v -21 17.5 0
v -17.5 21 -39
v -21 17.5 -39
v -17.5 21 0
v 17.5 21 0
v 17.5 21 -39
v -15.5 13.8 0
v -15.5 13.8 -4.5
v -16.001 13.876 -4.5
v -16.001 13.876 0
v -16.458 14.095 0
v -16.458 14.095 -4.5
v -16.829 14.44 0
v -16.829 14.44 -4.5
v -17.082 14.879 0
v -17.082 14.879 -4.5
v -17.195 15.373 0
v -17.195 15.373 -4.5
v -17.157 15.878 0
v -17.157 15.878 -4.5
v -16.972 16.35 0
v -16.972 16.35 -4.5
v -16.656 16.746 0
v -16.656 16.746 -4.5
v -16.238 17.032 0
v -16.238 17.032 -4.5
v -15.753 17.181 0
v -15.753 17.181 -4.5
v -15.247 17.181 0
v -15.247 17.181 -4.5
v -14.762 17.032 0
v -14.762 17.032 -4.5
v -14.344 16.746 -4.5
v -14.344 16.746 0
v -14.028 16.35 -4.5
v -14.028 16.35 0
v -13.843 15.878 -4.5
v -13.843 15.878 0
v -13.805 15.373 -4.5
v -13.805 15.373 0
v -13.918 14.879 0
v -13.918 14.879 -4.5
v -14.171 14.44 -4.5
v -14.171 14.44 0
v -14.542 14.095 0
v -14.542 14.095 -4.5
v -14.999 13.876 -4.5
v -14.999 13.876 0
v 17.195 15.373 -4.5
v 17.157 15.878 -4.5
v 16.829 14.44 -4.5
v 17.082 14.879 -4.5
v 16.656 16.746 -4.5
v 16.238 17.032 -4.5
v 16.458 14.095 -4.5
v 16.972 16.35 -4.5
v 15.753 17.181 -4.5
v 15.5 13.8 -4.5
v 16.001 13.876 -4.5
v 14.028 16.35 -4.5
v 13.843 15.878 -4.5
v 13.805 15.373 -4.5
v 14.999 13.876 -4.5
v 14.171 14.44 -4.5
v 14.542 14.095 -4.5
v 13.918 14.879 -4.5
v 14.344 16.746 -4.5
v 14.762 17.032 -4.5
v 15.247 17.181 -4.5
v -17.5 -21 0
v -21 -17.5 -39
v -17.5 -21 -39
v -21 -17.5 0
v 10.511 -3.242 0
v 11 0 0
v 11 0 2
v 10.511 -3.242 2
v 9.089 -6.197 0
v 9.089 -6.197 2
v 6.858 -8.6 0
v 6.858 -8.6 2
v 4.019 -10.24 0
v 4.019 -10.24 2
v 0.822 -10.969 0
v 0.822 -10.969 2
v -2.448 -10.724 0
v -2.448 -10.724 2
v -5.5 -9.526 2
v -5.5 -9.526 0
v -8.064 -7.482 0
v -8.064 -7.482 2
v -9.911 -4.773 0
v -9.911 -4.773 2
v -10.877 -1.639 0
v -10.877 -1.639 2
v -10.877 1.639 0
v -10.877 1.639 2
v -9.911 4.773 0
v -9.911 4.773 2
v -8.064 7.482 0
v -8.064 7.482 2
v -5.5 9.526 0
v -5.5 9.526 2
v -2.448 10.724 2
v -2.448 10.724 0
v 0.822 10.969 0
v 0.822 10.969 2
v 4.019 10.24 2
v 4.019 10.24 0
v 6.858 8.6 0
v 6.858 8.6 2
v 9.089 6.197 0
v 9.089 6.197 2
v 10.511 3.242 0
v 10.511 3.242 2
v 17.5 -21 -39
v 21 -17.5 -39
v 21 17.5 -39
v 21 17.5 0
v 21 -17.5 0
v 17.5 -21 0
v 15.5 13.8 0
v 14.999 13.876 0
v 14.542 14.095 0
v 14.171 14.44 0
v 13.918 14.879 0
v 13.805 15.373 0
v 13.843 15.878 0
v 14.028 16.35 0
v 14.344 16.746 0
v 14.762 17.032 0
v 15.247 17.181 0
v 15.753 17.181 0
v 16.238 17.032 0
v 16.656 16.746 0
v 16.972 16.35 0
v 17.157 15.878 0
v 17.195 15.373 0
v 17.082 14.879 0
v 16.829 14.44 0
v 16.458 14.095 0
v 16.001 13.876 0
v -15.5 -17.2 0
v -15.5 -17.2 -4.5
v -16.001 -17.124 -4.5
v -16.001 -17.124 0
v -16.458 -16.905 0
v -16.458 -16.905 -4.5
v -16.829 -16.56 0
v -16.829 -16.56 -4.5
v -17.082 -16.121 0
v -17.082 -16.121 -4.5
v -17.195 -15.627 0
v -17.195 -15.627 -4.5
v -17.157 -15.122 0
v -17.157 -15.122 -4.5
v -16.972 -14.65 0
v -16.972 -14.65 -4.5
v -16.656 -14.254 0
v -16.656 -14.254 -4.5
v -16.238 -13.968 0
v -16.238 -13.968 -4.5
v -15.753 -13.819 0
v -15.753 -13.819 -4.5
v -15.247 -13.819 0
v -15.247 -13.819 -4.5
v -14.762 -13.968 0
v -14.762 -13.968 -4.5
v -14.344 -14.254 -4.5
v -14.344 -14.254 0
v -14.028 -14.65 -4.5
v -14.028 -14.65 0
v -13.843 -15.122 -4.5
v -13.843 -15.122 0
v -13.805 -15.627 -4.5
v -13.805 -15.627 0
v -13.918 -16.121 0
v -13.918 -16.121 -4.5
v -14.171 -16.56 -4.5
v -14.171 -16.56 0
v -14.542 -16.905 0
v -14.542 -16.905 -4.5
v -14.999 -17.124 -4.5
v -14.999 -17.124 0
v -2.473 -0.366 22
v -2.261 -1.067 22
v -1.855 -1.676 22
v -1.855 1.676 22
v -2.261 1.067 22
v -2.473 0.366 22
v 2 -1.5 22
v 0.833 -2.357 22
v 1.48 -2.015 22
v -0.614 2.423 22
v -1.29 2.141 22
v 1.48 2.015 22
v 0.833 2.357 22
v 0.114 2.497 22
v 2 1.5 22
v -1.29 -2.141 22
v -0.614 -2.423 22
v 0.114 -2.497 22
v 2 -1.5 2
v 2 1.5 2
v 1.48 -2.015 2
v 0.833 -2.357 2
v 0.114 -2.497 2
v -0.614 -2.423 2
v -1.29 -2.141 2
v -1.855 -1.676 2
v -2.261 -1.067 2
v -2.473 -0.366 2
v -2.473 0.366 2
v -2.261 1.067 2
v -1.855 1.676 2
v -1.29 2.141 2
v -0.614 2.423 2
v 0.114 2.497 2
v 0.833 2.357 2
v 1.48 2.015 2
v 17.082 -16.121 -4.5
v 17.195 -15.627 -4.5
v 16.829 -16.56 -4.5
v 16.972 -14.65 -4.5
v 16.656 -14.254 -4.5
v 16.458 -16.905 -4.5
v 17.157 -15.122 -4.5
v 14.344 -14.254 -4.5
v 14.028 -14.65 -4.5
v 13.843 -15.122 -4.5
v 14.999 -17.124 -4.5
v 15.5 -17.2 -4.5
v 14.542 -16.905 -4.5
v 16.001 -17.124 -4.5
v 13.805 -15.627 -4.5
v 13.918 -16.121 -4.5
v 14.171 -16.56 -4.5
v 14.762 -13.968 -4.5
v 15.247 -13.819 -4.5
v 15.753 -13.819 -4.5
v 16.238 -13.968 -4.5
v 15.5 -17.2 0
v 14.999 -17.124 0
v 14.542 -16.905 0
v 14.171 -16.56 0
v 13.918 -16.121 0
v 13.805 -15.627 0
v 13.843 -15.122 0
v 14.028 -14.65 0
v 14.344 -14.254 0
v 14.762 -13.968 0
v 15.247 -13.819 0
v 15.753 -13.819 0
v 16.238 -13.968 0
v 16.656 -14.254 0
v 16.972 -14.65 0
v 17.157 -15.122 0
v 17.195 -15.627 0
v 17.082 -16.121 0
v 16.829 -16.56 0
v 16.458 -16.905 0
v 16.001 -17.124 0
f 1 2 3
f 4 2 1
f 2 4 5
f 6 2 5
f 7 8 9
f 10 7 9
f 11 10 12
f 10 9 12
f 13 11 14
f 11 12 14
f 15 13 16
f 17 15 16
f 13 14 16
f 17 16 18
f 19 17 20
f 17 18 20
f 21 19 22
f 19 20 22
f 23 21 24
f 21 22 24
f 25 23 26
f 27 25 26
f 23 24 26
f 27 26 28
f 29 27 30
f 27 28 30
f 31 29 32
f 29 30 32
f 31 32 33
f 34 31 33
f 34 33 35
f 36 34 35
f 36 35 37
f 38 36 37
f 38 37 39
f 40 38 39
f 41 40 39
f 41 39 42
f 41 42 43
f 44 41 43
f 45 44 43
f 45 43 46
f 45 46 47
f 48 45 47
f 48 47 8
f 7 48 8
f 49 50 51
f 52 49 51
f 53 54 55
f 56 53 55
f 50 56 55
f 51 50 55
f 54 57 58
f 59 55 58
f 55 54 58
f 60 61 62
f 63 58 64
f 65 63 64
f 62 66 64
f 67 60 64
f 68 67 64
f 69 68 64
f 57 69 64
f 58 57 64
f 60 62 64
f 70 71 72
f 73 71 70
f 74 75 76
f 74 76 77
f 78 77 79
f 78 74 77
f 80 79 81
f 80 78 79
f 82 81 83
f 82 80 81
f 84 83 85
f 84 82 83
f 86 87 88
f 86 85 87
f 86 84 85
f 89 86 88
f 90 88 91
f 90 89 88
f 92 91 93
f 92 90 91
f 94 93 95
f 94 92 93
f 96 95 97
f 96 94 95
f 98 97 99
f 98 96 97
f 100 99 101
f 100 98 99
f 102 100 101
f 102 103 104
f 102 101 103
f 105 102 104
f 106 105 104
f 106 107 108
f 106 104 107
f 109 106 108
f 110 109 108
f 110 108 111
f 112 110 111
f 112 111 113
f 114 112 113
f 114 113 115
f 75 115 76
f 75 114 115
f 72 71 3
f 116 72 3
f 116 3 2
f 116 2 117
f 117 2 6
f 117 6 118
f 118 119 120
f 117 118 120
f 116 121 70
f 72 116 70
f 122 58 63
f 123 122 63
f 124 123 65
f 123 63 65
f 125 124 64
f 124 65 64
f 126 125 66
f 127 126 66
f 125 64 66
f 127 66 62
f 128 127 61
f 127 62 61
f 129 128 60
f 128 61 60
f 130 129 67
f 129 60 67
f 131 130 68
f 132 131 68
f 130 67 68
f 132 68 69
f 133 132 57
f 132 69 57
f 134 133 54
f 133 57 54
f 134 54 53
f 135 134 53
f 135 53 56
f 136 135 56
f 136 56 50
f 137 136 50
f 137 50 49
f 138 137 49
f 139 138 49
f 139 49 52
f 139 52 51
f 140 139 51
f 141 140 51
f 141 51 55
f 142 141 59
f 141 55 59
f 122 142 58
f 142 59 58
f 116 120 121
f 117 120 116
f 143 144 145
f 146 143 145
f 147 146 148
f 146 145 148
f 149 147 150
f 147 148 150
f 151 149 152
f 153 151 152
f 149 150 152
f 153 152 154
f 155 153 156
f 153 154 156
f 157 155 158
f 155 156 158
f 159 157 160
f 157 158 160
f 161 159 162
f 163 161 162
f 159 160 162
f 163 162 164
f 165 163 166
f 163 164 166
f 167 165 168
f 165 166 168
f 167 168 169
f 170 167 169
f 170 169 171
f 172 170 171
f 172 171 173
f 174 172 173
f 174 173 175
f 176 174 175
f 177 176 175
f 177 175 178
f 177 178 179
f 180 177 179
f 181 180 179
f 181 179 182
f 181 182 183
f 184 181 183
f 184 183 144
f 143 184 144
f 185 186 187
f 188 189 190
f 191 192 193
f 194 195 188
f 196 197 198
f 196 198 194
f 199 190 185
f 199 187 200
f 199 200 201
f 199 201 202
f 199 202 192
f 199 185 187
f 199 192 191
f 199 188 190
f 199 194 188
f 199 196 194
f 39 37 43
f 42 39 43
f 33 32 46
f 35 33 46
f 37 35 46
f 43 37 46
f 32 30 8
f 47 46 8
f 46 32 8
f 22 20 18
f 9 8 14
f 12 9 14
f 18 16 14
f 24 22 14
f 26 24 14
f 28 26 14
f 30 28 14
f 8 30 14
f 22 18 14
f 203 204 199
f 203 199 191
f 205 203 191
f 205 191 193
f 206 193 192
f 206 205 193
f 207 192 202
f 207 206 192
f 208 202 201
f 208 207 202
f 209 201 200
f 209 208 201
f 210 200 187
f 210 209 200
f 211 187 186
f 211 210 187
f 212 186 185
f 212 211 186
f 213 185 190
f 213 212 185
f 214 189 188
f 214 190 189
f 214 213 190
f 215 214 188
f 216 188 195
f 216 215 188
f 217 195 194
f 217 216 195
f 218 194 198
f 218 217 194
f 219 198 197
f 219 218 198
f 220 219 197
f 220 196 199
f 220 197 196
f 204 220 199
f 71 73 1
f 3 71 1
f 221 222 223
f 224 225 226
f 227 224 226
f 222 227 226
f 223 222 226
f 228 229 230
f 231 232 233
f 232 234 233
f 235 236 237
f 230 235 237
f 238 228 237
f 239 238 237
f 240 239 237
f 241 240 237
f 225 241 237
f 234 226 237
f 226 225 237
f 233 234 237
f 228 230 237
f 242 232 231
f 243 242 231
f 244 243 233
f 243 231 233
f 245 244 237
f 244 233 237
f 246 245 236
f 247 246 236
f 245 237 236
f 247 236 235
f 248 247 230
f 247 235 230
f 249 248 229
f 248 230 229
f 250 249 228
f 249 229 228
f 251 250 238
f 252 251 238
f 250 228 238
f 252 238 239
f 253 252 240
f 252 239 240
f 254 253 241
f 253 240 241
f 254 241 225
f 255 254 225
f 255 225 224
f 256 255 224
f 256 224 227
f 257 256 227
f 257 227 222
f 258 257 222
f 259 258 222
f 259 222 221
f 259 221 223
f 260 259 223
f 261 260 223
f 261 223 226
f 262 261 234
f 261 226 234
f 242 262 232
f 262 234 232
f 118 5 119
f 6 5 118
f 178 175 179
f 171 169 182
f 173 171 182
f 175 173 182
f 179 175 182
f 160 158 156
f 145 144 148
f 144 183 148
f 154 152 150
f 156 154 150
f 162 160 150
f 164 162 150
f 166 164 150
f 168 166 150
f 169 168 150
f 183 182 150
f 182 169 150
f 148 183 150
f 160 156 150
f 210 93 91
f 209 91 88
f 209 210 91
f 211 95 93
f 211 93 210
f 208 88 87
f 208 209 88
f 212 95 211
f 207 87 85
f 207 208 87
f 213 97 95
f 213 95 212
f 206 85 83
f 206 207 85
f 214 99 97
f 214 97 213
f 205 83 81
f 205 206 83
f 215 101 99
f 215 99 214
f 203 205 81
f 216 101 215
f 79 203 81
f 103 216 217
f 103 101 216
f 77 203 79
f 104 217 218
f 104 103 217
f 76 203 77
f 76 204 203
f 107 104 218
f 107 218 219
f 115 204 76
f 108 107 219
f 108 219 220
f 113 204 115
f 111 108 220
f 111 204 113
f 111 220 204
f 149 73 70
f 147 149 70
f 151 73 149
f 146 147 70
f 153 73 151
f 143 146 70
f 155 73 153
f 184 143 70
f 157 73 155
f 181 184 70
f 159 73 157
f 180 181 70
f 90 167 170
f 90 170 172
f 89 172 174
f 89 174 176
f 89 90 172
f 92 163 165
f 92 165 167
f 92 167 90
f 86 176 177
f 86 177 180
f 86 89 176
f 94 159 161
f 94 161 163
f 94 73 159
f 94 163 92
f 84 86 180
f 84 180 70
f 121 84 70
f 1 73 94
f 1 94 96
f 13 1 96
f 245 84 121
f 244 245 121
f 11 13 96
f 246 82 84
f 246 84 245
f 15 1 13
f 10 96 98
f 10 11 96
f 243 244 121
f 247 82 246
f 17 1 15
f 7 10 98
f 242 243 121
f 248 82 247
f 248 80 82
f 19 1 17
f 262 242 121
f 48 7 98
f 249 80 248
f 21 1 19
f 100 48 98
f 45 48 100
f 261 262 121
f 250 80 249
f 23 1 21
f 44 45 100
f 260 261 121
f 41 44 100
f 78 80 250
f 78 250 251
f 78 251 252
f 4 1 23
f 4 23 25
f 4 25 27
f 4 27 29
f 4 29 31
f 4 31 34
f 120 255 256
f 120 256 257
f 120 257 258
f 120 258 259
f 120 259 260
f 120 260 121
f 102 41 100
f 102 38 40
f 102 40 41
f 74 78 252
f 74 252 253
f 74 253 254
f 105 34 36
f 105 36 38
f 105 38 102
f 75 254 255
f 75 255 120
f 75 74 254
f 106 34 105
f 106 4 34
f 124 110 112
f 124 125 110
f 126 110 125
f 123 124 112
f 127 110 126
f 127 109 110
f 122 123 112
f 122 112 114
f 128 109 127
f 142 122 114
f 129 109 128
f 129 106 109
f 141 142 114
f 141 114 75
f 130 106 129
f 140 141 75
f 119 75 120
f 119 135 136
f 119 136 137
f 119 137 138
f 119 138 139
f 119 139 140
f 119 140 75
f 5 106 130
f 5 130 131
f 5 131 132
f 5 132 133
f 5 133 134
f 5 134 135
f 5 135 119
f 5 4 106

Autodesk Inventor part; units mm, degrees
ref_plane "YZ Plane" through (0, 0, 0) normal (1, 0, 0) x (0, 1, 0)
ref_plane "XZ Plane" through (0, 0, 0) normal (0, 1, 0) x (-1, 0, 0)
ref_plane "XY Plane" through (0, 0, 0) normal (0, 0, 1) x (1, 0, 0)
sketch "Sketch1" plane through (0, 0, 0) normal (0, 0, 1) x (1, 0, 0)
  line L0 (21, -21) -> (-21, -21)
  line L1 (-21, -21) -> (-21, 21)
  line L2 (-21, 21) -> (21, 21)
  line L3 (21, 21) -> (21, -21)
  line L4 (21, -21) -> (-21, 21) construction
  line L5 (-21, -21) -> (21, 21) construction
  circle A0 centre (0, 0) radius 11
  circle A1 centre (0, 0) radius 2.5
  line L6 (2, 1.5) -> (2, -1.5)
  line L7 (0, 21) -> (0, -21) construction
  line L8 (-21, 0) -> (21, 0) construction
  point P0 (-15.5, 15.5)
  point P1 (15.5, 15.5)
  point P2 (15.5, -15.5)
  point P3 (-15.5, -15.5)
  dimension "d0" = 42
  dimension "d1" = 42
  dimension "d2" = 22
  dimension "d3" = 5
  dimension "d4" = 2
  dimension "d5" = 31
extrude "Extrusion1" add sketch "Sketch1" against normal blind 39 contours L0 L1 L2 L3 | A0 | A1 L6 | L6 A1
extrude "Extrusion2" add sketch "Sketch1" along normal blind 2 contours A0 | A1 L6 | L6 A1
extrude "Extrusion3" add sketch "Sketch1" along normal blind 22 contours L6 A1 picked at (0.2258, 0.7583)
hole "Hole1" at (-15.5, -15.5, 0) at (-15.5, 15.5, 0) at (15.5, 15.5, 0) at (15.5, -15.5, 0) direction (0, 0, -1) diameter 3.4 depth 4.5 clearance for "Countersunk Head GOST 12876-67" size "M3" standard "GOST"
chamfer "Chamfer1" distance 3.5 angle 45 4 edges at (-21, -21, -19.5) (-21, 21, -19.5) (21, -21, -19.5) (21, 21, -19.5)
properties part number "motor_x"
